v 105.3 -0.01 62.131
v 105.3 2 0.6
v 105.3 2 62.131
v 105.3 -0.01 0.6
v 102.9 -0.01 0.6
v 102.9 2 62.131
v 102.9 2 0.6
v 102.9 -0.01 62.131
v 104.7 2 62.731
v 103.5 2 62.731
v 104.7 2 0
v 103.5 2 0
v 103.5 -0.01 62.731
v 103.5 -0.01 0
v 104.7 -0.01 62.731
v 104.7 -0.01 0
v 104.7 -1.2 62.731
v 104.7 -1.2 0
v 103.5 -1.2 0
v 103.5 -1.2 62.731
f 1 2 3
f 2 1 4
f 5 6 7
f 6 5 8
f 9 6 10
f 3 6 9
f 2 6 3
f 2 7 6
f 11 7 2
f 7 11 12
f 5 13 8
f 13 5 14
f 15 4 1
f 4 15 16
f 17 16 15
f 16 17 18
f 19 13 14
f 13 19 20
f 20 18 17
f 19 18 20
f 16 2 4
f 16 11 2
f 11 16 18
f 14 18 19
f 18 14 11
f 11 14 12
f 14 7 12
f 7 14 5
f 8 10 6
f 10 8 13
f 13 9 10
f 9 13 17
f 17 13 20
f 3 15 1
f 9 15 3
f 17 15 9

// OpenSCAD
include <../lib/spool-drybox-lib.scad>;
$fn = 40;
panel_gasket("lid-front");
